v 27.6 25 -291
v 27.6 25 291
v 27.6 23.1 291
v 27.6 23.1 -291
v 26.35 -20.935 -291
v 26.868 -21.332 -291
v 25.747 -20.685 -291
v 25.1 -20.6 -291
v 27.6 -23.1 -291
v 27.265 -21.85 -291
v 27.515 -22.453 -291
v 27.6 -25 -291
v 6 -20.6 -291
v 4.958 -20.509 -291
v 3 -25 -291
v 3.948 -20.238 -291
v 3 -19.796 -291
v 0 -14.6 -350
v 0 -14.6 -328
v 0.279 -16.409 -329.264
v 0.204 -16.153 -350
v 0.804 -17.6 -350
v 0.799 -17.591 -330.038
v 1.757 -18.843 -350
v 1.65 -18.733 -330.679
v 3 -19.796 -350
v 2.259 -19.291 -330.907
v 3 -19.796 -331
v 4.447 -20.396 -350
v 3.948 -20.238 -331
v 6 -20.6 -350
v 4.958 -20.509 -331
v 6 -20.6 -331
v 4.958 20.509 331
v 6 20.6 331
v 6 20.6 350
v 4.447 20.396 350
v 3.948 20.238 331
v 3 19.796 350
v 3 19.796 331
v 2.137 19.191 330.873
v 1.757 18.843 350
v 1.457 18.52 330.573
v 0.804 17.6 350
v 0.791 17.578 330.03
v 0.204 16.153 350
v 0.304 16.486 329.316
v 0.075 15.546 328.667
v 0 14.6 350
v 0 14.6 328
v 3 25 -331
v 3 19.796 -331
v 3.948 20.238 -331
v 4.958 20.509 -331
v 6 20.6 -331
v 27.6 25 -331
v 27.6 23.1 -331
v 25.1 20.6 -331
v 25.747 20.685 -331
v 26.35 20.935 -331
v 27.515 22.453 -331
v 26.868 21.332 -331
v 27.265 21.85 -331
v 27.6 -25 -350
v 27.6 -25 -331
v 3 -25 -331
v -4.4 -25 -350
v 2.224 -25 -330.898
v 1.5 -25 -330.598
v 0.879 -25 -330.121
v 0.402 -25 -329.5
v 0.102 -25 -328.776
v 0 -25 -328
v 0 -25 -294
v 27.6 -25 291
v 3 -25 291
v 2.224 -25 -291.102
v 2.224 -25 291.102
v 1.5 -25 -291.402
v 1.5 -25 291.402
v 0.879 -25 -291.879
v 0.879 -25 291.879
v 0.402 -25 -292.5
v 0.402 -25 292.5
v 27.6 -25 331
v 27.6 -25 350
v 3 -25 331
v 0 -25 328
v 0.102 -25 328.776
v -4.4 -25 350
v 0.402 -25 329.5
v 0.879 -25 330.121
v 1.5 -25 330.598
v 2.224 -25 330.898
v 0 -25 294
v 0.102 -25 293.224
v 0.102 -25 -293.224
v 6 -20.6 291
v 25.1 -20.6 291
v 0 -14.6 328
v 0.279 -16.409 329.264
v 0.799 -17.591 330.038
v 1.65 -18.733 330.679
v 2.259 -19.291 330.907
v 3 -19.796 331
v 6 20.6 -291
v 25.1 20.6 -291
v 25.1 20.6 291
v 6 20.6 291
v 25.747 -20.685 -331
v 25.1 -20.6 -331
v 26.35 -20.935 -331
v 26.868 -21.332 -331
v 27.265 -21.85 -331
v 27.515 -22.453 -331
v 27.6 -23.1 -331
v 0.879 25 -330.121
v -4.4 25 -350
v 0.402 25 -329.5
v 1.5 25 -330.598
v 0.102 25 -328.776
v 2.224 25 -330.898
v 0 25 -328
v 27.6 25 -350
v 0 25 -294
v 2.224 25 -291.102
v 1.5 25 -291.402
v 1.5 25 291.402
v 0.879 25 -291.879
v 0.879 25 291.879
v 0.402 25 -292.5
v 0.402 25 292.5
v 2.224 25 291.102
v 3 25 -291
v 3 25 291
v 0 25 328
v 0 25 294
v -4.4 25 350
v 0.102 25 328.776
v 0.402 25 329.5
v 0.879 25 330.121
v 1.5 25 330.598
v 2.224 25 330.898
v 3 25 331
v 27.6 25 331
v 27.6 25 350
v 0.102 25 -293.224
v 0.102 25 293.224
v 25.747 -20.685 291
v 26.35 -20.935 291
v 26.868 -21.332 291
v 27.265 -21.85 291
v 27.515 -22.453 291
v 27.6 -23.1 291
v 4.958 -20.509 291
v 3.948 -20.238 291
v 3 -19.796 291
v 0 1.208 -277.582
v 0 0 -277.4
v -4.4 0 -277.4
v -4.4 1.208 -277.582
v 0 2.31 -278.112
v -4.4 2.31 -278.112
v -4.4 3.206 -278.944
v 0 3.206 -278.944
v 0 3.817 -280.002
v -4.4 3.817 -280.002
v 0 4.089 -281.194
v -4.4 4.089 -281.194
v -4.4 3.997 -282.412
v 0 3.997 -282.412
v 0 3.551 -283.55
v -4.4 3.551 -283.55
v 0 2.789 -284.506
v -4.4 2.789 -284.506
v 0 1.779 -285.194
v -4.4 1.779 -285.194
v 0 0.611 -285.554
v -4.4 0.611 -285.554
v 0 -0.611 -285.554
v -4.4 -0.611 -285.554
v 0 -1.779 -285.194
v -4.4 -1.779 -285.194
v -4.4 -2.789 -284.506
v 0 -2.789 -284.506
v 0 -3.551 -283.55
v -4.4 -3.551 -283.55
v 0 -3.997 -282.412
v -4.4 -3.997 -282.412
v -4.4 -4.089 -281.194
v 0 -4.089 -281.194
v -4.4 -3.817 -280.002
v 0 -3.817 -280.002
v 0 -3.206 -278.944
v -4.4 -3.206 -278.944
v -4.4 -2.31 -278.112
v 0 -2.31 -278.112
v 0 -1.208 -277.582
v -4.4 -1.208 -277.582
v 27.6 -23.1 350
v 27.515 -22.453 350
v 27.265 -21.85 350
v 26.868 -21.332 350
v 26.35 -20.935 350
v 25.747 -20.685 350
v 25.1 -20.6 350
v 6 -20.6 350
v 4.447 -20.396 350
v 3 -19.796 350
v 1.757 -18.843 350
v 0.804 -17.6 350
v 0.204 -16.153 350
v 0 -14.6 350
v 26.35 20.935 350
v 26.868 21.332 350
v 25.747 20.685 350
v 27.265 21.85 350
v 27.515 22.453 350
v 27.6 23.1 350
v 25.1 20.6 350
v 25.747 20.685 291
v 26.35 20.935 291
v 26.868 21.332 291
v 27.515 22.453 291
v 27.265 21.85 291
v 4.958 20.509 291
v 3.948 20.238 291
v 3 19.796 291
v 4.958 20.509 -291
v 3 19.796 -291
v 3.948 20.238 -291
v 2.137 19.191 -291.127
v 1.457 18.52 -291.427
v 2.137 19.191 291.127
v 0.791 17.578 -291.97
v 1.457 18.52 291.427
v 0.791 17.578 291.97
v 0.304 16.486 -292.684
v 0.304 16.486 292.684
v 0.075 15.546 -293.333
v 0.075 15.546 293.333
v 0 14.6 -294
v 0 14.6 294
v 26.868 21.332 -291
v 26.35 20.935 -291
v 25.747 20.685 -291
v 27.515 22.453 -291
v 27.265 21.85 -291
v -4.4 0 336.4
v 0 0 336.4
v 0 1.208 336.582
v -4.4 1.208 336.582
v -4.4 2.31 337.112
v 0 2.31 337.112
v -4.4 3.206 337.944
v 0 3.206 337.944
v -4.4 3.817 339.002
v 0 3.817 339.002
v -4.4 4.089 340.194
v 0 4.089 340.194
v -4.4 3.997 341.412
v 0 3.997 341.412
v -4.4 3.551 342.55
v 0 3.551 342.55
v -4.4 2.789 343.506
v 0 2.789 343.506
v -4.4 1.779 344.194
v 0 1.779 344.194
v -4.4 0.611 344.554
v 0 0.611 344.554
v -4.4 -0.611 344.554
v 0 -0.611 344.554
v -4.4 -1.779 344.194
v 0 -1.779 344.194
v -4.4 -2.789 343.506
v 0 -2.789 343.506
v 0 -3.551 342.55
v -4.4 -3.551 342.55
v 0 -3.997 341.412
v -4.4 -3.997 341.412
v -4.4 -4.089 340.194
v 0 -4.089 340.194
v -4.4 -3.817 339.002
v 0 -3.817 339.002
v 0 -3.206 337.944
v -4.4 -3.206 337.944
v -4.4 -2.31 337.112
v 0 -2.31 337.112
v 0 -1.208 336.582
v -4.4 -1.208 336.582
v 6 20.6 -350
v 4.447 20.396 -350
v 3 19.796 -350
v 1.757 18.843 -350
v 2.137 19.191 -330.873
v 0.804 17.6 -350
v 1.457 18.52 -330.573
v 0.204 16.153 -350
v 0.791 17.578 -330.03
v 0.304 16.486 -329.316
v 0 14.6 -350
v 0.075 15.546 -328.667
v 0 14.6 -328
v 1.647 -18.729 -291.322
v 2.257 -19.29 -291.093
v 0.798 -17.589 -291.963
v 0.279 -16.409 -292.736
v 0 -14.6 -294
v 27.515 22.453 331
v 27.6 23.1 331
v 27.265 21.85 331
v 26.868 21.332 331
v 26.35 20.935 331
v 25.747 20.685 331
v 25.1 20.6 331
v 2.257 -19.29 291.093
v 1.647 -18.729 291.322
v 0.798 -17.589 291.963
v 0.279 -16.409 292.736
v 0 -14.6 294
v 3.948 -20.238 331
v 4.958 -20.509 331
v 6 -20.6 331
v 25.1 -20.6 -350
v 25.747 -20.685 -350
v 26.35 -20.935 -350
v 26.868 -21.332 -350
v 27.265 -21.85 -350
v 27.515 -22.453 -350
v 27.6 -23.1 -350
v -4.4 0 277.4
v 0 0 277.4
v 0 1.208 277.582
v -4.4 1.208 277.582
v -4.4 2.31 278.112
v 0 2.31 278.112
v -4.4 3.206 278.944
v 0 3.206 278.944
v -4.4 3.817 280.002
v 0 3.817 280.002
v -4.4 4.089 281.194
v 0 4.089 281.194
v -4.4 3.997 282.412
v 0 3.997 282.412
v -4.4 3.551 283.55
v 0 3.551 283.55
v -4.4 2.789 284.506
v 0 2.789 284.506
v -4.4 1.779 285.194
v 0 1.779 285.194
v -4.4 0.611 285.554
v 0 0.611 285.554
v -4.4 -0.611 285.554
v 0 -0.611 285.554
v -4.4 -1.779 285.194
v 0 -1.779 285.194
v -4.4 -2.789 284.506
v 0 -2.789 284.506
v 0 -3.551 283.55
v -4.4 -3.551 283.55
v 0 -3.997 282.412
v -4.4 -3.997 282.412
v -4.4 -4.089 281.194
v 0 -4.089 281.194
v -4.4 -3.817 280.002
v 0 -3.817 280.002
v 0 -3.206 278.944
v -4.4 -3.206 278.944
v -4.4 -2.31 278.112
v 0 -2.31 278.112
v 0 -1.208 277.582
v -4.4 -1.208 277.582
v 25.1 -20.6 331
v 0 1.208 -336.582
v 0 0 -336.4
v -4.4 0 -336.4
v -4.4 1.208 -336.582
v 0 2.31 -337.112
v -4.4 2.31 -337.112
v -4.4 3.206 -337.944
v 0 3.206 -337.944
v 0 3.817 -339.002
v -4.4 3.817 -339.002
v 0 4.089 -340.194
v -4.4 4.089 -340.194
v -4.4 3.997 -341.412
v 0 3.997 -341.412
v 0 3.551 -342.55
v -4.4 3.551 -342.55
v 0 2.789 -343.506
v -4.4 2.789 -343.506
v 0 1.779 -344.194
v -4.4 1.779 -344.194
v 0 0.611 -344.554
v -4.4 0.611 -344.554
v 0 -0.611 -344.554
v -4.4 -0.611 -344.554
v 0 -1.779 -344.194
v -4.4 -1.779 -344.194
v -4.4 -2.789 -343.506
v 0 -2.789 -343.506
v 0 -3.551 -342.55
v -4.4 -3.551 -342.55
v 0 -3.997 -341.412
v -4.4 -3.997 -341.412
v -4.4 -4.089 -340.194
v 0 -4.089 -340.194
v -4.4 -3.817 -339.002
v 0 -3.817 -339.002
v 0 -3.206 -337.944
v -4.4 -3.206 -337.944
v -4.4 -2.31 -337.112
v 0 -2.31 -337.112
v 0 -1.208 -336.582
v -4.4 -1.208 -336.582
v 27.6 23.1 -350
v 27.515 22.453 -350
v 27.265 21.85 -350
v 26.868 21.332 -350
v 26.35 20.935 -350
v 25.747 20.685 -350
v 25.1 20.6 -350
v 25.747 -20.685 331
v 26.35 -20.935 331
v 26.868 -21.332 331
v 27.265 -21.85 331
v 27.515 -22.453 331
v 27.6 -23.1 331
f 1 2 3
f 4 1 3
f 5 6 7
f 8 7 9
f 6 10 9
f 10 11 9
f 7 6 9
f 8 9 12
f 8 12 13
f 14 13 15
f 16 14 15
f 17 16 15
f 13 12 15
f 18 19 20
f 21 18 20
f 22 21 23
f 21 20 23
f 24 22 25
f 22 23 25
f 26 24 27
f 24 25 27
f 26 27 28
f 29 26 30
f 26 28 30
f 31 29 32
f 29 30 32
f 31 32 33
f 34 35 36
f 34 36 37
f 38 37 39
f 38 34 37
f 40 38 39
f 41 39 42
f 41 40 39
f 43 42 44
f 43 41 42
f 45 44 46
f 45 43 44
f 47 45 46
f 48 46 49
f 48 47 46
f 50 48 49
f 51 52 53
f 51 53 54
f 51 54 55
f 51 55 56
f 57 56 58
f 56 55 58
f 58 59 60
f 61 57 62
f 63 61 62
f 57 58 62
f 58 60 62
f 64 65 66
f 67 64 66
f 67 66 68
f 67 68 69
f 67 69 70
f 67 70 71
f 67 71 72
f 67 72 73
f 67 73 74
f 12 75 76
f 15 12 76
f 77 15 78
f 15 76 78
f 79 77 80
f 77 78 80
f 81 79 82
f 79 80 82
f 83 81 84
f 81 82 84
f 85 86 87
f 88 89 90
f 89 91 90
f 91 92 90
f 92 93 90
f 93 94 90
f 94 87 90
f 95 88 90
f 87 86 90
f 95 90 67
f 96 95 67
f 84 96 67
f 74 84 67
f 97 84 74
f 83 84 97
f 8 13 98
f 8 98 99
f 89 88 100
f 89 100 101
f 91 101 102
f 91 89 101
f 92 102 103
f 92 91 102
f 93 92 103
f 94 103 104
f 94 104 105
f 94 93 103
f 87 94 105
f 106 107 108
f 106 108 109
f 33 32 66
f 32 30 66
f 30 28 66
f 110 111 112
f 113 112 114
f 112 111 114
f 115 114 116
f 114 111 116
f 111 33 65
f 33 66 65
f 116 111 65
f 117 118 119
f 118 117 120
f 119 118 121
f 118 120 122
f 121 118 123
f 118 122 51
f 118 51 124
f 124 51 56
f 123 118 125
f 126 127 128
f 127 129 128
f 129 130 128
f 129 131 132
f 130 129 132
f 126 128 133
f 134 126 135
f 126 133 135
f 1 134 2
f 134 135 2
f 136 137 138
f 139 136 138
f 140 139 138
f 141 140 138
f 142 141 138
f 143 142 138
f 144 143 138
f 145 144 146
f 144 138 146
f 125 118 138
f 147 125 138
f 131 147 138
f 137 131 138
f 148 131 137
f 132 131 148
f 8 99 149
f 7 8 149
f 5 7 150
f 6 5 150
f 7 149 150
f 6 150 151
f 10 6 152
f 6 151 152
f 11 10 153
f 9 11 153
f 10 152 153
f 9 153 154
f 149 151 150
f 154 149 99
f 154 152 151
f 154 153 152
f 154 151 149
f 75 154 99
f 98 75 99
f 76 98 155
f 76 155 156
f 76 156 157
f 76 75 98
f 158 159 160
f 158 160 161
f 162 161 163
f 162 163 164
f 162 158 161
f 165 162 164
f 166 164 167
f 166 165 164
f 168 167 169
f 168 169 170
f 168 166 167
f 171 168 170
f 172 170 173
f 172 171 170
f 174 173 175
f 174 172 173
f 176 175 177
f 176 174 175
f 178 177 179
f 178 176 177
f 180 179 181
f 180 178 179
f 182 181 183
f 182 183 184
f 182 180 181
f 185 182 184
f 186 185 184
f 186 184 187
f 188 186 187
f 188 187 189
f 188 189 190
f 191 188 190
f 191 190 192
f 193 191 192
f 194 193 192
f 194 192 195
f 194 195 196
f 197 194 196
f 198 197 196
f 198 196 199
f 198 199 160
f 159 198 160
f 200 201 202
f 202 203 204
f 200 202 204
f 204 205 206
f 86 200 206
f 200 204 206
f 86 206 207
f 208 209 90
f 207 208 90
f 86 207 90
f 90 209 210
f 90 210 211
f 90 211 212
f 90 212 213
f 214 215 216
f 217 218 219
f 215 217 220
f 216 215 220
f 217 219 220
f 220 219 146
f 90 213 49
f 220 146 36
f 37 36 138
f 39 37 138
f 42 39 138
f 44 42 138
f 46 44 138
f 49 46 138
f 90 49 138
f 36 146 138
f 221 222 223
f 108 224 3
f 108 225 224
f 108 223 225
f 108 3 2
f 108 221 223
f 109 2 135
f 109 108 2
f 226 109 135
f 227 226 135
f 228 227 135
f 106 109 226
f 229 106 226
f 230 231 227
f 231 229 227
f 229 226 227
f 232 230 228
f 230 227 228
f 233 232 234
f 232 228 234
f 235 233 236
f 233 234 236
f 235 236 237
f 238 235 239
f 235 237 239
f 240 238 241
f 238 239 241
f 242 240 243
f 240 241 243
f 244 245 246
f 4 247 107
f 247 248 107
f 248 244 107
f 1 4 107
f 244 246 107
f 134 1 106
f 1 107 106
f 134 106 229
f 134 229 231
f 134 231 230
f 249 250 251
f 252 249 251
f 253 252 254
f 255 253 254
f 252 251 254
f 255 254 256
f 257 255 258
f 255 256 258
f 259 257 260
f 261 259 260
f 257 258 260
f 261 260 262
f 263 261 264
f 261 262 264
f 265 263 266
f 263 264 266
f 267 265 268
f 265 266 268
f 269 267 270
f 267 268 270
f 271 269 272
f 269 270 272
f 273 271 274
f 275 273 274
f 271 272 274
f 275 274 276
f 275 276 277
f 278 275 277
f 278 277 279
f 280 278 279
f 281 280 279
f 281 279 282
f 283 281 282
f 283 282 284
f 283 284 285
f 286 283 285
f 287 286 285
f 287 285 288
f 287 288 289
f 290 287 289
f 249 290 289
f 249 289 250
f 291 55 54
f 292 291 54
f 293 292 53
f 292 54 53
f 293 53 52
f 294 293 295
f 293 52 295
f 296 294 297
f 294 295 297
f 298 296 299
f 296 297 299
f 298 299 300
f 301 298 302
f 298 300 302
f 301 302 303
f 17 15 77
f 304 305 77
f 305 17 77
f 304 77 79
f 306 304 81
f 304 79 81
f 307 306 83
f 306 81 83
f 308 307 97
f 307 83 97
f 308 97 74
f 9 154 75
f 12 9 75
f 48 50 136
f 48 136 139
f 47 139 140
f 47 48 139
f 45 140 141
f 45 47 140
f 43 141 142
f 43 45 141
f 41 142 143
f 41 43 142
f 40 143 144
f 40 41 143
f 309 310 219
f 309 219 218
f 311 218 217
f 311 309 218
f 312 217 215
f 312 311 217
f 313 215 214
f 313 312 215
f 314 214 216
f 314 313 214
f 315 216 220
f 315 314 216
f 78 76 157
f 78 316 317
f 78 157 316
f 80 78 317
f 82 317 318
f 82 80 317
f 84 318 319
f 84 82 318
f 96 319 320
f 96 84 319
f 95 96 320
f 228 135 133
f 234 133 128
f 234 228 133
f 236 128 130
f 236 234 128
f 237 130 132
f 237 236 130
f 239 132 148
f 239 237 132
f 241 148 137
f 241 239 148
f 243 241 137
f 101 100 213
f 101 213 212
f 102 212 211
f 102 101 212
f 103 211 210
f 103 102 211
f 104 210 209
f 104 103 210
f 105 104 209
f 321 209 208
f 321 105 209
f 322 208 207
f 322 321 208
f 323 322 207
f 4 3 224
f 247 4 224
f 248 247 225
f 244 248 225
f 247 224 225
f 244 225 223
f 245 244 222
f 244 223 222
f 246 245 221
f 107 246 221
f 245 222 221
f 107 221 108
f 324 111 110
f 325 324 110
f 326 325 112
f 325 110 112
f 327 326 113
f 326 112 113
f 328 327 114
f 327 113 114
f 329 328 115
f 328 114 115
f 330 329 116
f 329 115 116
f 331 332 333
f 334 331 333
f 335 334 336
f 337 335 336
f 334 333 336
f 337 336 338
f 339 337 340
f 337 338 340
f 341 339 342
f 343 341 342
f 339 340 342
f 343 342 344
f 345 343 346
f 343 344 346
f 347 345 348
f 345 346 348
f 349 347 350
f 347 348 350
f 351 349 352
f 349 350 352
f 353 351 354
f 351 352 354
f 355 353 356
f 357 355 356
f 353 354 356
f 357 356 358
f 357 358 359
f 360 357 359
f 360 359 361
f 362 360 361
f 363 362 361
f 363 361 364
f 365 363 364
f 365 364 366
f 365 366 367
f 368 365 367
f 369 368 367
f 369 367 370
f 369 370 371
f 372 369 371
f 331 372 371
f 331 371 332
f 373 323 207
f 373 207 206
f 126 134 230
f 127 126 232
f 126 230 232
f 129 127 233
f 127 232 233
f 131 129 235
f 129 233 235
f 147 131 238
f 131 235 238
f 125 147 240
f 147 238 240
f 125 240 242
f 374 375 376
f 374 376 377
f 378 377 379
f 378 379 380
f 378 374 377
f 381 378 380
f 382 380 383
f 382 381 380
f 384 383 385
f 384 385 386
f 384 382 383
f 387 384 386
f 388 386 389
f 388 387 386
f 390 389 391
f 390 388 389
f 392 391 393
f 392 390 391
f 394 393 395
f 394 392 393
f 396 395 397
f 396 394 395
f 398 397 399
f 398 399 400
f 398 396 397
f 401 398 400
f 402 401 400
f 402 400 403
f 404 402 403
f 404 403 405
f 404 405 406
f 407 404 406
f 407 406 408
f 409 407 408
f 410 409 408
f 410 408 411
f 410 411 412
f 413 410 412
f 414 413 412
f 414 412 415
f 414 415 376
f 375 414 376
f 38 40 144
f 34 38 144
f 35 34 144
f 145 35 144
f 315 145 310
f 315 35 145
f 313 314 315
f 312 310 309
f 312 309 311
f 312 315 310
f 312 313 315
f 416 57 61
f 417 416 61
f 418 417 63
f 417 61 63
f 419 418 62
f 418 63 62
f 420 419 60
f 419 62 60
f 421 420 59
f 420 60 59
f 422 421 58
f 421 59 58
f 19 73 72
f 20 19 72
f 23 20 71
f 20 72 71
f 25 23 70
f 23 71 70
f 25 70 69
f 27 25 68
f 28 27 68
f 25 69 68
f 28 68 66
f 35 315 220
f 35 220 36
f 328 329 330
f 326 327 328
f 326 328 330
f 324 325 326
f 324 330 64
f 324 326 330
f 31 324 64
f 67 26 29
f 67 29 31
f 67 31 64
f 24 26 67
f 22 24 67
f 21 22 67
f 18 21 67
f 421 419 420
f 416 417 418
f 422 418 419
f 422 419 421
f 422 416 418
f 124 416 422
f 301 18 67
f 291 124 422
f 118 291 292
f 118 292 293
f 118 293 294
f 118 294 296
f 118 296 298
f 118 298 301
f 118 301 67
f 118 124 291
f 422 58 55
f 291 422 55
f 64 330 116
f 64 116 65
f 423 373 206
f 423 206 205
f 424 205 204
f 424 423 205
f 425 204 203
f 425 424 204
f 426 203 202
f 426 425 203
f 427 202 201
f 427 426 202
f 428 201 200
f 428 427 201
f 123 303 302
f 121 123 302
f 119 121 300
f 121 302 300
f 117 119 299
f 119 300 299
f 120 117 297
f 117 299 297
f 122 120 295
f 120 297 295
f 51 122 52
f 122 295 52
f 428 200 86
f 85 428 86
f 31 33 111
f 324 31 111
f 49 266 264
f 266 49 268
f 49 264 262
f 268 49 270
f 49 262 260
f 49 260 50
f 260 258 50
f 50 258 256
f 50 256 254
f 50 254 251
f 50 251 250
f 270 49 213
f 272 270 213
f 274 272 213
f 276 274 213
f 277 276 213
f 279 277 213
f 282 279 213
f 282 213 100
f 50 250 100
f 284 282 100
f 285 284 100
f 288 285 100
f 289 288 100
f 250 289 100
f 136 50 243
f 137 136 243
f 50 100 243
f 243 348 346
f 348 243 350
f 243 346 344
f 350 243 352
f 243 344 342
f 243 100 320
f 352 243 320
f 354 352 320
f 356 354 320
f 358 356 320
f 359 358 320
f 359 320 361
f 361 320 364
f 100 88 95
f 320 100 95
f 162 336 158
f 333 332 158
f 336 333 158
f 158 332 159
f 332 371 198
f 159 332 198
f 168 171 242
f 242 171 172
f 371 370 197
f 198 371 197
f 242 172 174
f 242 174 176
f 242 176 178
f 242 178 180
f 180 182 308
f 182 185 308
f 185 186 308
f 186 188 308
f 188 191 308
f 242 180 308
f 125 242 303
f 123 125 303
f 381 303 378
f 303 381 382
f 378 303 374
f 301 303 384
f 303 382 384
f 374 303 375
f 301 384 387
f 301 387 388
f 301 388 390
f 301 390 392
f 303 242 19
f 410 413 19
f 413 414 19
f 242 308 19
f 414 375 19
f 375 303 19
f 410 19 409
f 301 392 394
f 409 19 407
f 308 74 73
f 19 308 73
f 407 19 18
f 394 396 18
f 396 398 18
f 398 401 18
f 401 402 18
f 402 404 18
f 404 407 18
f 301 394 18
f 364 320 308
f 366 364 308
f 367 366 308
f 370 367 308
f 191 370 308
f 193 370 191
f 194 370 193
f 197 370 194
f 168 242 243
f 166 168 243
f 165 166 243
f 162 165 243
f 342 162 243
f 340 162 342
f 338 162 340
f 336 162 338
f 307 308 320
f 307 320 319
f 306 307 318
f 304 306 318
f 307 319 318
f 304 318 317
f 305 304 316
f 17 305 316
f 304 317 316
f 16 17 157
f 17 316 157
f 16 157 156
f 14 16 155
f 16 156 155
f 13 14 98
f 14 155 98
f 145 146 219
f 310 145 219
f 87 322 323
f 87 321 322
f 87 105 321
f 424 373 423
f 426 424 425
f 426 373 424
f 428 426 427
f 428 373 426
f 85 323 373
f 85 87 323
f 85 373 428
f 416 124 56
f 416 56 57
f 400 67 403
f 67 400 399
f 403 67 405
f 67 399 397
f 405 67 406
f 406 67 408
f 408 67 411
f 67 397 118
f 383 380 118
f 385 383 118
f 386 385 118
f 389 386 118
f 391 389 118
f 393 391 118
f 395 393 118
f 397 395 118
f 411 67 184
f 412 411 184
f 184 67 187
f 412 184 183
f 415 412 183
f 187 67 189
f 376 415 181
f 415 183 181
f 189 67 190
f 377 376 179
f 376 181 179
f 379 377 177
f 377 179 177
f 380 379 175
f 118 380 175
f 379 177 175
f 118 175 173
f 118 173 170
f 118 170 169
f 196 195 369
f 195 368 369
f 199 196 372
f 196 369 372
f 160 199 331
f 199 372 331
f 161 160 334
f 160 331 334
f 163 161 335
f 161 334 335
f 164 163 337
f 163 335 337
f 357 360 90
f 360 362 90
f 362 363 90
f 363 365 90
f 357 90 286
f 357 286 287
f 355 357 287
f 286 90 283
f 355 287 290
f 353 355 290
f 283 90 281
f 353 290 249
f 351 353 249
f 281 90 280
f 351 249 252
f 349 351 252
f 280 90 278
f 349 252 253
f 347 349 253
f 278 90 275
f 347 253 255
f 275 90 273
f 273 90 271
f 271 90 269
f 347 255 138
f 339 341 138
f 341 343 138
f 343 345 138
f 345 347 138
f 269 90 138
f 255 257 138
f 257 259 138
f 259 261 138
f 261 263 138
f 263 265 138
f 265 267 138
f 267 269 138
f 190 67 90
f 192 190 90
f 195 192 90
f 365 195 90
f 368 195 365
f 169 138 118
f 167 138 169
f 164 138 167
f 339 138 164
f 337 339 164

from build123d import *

# Parameters (mm, degrees)
EXTRUDE_1_DEPTH     = 350
OTHER_START         = -25
OTHER_1_DEPTH       = 50
SKETCH_4_R          = 4.1
CUT_EXTRUDE_1_DEPTH = 352.975510618


# Read off the part's stored shape, not the designer's step: Полость1
with BuildPart() as part:
    # Эскиз1 → Бобышка-Вытянуть1 (new body)
    with BuildSketch(Plane.XY):
        with BuildLine():
            Line((-4.4, -25), (-4.4, 25))
            Line((-4.4, 25), (27.6, 25))
            Line((27.6, 25), (27.6, 23.1))
            ThreePointArc((27.6, 23.1), (26.867766953, 21.332233047), (25.1, 20.6))
            Line((25.1, 20.6), (6, 20.6))
            ThreePointArc((6, 20.6), (1.757359313, 18.842640687), (0, 14.6))
            Line((0, 14.6), (0, -14.6))
            ThreePointArc((0, -14.6), (1.757359313, -18.842640687), (6, -20.6))
            Line((6, -20.6), (25.1, -20.6))
            ThreePointArc((25.1, -20.6), (26.867766953, -21.332233047), (27.6, -23.1))
            Line((27.6, -23.1), (27.6, -25))
            Line((27.6, -25), (-4.4, -25))
        make_face()
    extrude(amount=EXTRUDE_1_DEPTH)

    # Полость1 outline → Полость1 (cut)
    with BuildSketch(Plane(origin=(0, 0, 0), x_dir=(1, 0, 0), z_dir=(0, 1, 0)).offset(OTHER_START)):
        with BuildLine():
            ThreePointArc((3, -291), (0.878679656, -291.878679656), (0, -294))
            Line((0, -294), (0, -328))
            ThreePointArc((0, -328), (0.878679656, -330.121320344), (3, -331))
            Line((3, -331), (27.6, -331))
            Line((27.6, -331), (27.6, -291))
            Line((27.6, -291), (3, -291))
        make_face()
    extrude(amount=OTHER_1_DEPTH, mode=Mode.SUBTRACT)

    # Эскиз4 → Вырез-Вытянуть1 (cut, through all)
    with BuildSketch(Plane(origin=(0, 0, 0), x_dir=(0, 0, -1), z_dir=(1, 0, 0))):
        with Locations((-340.5, 0)):
            Circle(SKETCH_4_R)
        with Locations((-281.5, 0)):
            Circle(SKETCH_4_R)
    extrude(amount=-CUT_EXTRUDE_1_DEPTH, mode=Mode.SUBTRACT)

    # Зеркальное отражение1: part across plane


with BuildPart() as part_1:
    add(part.part)
    add(part.part.mirror(Plane(origin=(25.1, 23.1, 0), x_dir=(1, 0, 0), z_dir=(0, 0, -1))))


solid = part_1.part
